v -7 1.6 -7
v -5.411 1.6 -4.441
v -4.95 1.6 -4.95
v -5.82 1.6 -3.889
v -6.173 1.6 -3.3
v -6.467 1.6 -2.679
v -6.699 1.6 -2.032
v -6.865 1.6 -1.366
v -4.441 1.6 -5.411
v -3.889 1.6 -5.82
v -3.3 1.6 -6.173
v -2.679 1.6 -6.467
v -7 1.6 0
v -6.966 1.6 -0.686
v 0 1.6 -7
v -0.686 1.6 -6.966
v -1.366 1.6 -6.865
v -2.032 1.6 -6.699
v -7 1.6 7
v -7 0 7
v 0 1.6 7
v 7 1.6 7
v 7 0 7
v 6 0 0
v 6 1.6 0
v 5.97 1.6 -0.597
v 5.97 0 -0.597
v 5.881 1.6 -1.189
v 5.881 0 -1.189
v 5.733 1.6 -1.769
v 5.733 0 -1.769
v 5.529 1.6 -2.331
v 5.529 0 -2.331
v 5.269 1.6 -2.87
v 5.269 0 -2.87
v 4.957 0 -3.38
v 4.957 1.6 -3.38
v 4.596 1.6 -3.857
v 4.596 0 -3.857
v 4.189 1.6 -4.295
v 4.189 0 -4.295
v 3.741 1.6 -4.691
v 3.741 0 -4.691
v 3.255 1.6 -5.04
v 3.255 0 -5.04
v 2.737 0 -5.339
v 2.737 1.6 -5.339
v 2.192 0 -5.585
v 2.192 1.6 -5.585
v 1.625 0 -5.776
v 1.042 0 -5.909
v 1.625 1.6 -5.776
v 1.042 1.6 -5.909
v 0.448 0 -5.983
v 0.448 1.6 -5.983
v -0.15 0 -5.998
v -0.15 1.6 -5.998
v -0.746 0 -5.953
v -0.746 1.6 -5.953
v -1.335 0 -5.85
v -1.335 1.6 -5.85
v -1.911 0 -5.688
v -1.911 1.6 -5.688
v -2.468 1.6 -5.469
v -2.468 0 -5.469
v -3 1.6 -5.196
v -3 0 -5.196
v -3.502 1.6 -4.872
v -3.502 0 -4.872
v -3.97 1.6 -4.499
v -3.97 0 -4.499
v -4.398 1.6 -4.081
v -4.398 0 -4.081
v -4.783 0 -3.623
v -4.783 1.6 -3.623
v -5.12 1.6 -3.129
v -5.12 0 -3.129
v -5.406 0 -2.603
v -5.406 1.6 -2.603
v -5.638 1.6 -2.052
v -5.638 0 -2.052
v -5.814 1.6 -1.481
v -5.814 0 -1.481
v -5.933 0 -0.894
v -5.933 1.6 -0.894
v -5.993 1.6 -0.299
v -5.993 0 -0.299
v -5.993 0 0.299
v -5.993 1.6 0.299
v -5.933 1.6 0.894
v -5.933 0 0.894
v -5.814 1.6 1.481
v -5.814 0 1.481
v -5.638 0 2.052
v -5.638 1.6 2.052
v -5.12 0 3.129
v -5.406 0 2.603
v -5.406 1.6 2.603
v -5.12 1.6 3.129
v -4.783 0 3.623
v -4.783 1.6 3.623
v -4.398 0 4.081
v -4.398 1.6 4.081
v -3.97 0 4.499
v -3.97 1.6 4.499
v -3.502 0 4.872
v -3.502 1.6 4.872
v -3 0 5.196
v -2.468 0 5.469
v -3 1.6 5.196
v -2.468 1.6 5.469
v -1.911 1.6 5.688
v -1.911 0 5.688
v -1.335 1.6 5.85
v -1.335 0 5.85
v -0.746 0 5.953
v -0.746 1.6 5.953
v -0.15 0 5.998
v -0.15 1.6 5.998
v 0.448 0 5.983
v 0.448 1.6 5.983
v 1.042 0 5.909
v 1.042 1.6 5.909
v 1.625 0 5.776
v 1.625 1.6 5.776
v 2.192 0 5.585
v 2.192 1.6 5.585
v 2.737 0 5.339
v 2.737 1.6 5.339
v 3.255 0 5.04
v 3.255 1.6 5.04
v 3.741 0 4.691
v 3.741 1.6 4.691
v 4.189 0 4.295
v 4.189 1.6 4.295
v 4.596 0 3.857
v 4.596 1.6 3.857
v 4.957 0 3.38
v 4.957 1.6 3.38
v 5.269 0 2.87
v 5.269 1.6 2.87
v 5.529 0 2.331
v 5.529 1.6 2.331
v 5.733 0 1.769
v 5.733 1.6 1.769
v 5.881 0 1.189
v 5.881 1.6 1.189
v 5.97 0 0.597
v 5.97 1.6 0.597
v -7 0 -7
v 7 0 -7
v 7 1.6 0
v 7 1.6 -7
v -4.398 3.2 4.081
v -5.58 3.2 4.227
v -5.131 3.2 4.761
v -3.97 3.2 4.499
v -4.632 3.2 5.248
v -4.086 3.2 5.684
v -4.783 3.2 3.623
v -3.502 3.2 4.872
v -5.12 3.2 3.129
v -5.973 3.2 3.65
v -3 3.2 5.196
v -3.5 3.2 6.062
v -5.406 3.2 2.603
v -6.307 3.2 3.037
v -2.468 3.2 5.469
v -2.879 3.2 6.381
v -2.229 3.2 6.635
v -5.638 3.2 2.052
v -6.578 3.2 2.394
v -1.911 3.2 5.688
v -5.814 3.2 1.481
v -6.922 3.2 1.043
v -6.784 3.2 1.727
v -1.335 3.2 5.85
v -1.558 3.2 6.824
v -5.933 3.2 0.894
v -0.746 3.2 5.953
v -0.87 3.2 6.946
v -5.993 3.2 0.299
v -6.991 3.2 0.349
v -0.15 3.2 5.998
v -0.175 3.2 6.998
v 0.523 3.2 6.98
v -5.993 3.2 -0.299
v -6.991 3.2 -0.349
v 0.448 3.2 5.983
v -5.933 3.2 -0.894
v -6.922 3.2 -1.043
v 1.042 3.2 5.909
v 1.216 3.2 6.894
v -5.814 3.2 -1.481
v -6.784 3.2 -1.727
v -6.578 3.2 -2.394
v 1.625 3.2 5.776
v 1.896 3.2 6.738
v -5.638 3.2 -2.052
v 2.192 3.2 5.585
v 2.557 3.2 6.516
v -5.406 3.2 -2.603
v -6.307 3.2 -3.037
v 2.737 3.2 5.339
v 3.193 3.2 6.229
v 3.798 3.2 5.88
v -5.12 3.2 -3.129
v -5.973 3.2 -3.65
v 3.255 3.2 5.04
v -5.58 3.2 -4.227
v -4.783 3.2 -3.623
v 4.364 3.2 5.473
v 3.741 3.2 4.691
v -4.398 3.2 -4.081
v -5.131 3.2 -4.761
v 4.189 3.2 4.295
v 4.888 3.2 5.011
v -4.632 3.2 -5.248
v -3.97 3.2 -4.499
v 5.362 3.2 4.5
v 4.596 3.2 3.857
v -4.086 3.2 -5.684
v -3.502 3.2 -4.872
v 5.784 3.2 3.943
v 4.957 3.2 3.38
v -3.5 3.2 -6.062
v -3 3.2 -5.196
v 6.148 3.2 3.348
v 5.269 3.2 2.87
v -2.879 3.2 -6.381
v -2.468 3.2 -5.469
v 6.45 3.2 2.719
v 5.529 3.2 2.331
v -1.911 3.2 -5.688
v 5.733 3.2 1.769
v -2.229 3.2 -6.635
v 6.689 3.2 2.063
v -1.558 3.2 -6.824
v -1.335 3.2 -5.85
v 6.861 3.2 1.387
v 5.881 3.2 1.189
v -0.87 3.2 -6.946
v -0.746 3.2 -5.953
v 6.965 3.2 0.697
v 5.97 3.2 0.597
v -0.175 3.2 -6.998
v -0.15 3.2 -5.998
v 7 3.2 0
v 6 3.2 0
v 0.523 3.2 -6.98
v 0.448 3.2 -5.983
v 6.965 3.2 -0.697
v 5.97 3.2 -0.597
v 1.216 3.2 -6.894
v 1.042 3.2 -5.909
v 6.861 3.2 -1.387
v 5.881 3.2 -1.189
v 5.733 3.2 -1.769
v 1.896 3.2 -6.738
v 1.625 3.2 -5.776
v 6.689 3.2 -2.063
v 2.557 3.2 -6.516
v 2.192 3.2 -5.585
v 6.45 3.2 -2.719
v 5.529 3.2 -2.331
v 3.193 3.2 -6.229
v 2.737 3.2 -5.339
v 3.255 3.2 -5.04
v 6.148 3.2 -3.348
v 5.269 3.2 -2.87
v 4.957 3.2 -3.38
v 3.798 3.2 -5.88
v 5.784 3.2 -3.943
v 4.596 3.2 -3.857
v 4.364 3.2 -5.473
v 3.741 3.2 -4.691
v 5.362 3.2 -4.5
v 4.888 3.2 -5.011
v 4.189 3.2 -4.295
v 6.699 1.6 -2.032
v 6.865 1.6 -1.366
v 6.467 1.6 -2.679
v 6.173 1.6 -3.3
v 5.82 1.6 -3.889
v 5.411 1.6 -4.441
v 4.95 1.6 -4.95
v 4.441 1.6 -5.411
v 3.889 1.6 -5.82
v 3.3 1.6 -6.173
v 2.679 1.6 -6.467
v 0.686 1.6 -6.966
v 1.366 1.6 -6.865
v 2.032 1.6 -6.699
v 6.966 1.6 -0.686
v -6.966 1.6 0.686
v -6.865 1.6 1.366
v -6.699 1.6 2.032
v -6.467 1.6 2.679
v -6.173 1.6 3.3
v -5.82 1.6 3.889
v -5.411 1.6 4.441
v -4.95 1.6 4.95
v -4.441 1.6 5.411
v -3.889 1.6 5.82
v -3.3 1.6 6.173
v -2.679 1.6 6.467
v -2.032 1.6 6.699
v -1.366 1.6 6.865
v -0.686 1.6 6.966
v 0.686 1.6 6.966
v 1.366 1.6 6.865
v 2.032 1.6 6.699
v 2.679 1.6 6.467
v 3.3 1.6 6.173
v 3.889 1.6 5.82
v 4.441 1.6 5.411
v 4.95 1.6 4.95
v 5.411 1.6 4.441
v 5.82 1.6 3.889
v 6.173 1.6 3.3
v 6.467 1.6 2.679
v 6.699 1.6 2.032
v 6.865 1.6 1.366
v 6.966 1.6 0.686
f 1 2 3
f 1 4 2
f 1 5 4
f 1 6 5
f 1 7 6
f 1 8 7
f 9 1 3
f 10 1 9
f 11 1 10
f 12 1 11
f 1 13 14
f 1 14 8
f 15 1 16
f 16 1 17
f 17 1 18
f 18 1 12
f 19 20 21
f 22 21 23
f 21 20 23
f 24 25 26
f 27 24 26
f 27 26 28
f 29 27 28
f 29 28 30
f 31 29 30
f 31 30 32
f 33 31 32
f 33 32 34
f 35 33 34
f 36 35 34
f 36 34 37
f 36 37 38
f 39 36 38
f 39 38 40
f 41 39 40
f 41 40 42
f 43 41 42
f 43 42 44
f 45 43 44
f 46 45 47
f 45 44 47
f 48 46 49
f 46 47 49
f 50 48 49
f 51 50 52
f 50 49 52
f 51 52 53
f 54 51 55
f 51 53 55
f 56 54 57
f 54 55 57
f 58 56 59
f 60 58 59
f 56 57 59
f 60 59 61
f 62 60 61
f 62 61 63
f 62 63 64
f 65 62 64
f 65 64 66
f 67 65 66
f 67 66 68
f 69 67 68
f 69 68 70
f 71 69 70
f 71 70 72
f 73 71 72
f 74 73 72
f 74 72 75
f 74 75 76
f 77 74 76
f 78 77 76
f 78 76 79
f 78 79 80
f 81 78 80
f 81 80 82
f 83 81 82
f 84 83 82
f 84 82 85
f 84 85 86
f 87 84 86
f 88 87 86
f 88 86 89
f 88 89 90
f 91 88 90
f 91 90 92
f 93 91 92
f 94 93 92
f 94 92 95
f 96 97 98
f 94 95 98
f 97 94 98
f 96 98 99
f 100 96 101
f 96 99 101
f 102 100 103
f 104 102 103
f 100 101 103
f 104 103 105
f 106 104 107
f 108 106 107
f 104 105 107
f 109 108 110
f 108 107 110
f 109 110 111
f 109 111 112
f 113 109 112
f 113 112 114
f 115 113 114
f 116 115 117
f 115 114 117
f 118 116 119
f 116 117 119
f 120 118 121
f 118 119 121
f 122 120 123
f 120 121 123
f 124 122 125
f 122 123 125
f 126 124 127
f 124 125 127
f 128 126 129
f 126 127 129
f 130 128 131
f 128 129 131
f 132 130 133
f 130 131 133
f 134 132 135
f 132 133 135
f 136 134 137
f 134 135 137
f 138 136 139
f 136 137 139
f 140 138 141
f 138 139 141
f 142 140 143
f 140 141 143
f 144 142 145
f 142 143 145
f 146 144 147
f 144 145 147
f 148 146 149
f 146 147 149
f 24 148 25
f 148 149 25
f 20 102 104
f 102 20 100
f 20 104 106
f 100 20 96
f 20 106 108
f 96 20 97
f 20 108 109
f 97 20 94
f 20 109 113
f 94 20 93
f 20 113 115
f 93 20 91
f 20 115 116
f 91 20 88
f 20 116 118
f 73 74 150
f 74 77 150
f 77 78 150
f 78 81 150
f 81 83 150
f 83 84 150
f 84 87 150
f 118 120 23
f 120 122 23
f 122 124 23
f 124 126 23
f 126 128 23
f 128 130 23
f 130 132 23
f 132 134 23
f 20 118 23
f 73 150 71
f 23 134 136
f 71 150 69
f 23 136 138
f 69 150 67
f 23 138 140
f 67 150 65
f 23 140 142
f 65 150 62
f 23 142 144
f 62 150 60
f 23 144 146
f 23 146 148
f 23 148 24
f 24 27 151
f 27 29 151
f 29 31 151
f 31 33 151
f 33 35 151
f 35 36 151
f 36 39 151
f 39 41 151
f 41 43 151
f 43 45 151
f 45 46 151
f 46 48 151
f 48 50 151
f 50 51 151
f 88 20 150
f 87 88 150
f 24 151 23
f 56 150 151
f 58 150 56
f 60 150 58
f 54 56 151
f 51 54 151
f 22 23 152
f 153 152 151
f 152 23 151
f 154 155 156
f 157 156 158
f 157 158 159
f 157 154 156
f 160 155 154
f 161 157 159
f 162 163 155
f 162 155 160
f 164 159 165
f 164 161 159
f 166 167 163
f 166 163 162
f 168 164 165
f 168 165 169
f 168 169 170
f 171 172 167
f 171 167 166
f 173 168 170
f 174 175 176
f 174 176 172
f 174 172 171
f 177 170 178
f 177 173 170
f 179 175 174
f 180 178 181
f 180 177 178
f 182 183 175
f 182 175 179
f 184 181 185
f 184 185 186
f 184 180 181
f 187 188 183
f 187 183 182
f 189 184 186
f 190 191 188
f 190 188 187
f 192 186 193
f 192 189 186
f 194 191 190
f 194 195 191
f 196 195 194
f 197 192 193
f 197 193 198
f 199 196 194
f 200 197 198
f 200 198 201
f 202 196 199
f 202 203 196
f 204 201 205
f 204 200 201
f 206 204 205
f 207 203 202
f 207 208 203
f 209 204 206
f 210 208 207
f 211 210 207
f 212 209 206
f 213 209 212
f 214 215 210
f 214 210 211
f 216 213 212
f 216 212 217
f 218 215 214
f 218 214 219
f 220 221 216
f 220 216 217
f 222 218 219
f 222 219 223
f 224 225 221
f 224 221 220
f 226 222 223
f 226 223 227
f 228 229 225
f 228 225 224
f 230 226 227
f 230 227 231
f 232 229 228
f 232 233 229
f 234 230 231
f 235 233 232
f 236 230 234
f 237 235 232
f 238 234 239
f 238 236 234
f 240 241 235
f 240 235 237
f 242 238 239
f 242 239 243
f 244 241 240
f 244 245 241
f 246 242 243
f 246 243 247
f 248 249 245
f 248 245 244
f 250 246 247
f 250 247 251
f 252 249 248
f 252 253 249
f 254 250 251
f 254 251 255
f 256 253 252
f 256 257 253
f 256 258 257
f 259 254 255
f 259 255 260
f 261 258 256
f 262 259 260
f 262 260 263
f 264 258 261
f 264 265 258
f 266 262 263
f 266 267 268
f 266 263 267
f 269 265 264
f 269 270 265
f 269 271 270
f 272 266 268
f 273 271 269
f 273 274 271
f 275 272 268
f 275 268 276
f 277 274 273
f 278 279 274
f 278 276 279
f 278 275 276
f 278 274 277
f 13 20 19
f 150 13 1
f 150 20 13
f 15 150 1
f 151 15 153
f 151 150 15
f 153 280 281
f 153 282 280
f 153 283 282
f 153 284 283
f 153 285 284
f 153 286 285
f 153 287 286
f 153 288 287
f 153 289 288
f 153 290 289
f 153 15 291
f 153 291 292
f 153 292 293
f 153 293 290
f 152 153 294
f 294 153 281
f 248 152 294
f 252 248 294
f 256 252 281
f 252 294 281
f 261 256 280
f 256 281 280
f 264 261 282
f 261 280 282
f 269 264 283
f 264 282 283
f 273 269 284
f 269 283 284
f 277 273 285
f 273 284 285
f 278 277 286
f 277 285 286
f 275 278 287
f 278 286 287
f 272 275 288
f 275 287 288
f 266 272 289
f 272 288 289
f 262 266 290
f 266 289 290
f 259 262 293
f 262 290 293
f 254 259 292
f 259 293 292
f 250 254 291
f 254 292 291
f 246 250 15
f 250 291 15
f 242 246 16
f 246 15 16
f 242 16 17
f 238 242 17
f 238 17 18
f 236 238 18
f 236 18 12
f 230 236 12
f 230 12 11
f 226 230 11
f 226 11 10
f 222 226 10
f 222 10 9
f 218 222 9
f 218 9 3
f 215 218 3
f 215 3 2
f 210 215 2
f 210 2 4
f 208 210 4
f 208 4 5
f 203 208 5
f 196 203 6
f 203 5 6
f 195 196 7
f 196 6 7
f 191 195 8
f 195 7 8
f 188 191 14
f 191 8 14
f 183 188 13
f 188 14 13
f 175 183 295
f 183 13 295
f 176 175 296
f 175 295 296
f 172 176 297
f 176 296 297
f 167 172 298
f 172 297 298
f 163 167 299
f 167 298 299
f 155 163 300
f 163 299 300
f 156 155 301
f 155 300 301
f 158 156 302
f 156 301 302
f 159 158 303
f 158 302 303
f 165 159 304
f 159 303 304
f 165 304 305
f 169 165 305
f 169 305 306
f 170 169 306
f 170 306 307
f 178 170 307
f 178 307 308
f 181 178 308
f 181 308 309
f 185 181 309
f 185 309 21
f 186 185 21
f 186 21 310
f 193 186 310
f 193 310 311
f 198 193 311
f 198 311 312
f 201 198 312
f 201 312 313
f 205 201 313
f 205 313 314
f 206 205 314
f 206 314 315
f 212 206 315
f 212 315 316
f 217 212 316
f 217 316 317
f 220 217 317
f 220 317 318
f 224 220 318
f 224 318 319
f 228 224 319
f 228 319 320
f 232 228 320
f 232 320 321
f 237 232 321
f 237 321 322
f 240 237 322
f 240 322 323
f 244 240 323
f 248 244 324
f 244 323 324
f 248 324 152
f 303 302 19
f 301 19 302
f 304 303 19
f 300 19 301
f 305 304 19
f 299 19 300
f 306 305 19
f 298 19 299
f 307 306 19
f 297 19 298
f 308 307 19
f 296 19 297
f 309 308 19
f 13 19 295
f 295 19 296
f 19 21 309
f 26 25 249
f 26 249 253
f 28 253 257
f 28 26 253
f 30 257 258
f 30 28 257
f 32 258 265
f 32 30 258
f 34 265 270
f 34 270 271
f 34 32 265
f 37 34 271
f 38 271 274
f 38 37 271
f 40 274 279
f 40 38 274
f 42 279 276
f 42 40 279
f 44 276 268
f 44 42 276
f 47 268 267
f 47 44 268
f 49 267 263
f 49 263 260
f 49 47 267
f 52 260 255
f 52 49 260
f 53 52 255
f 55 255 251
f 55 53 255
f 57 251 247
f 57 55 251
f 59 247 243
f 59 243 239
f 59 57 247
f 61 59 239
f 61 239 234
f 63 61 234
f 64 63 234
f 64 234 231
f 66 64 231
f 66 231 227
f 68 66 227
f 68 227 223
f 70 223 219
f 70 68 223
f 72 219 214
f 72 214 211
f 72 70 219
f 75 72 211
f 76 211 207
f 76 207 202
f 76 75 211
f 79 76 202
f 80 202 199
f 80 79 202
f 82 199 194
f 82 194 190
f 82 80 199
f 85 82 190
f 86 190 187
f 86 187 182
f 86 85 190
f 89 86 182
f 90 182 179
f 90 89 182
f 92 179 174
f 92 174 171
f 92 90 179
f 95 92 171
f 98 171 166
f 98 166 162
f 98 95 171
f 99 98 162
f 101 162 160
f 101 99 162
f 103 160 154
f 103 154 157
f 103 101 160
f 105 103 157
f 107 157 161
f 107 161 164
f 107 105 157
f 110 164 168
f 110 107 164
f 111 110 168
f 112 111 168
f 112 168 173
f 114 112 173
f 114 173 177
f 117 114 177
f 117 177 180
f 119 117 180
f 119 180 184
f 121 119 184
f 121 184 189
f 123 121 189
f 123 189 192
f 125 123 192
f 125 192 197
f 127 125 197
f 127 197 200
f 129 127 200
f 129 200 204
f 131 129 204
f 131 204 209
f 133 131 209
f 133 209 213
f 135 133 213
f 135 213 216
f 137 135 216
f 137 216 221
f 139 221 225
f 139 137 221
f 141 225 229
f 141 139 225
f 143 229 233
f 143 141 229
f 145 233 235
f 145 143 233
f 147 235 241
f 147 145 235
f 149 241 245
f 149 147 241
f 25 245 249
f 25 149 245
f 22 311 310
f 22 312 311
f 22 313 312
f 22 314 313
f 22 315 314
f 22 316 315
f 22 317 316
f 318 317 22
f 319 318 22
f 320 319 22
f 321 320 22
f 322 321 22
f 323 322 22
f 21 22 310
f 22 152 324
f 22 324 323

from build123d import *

# Parameters (mm, degrees)
SKETCH1_W           = 14
SKETCH1_H           = 14
BOSS_EXTRUDE1_DEPTH = 1.6
SKETCH2_R           = 7
SKETCH2_R_2         = 6
BOSS_EXTRUDE2_DEPTH = 1.6
SKETCH3_R           = 6
CUT_EXTRUDE1_DEPTH  = 2.6


with BuildPart() as part:
    # Sketch1 → Boss-Extrude1 (new body)
    with BuildSketch(Plane(origin=(0, 0, 0), x_dir=(1, 0, 0), z_dir=(0, 1, 0))):
        Rectangle(SKETCH1_W, SKETCH1_H)
    extrude(amount=BOSS_EXTRUDE1_DEPTH)

    # Sketch2 → Boss-Extrude2 (add)
    with BuildSketch(Plane(origin=(0, 1.6, 0), x_dir=(1, 0, 0), z_dir=(0, 1, 0))):
        Circle(SKETCH2_R)
        Circle(SKETCH2_R_2, mode=Mode.SUBTRACT)
    extrude(amount=BOSS_EXTRUDE2_DEPTH)

    # Sketch3 → Cut-Extrude1 (cut, through all)
    with BuildSketch(Plane(origin=(0, 1.6, 0), x_dir=(1, 0, 0), z_dir=(0, 1, 0))):
        Circle(SKETCH3_R)
    extrude(amount=-CUT_EXTRUDE1_DEPTH, mode=Mode.SUBTRACT)


solid = part.part
